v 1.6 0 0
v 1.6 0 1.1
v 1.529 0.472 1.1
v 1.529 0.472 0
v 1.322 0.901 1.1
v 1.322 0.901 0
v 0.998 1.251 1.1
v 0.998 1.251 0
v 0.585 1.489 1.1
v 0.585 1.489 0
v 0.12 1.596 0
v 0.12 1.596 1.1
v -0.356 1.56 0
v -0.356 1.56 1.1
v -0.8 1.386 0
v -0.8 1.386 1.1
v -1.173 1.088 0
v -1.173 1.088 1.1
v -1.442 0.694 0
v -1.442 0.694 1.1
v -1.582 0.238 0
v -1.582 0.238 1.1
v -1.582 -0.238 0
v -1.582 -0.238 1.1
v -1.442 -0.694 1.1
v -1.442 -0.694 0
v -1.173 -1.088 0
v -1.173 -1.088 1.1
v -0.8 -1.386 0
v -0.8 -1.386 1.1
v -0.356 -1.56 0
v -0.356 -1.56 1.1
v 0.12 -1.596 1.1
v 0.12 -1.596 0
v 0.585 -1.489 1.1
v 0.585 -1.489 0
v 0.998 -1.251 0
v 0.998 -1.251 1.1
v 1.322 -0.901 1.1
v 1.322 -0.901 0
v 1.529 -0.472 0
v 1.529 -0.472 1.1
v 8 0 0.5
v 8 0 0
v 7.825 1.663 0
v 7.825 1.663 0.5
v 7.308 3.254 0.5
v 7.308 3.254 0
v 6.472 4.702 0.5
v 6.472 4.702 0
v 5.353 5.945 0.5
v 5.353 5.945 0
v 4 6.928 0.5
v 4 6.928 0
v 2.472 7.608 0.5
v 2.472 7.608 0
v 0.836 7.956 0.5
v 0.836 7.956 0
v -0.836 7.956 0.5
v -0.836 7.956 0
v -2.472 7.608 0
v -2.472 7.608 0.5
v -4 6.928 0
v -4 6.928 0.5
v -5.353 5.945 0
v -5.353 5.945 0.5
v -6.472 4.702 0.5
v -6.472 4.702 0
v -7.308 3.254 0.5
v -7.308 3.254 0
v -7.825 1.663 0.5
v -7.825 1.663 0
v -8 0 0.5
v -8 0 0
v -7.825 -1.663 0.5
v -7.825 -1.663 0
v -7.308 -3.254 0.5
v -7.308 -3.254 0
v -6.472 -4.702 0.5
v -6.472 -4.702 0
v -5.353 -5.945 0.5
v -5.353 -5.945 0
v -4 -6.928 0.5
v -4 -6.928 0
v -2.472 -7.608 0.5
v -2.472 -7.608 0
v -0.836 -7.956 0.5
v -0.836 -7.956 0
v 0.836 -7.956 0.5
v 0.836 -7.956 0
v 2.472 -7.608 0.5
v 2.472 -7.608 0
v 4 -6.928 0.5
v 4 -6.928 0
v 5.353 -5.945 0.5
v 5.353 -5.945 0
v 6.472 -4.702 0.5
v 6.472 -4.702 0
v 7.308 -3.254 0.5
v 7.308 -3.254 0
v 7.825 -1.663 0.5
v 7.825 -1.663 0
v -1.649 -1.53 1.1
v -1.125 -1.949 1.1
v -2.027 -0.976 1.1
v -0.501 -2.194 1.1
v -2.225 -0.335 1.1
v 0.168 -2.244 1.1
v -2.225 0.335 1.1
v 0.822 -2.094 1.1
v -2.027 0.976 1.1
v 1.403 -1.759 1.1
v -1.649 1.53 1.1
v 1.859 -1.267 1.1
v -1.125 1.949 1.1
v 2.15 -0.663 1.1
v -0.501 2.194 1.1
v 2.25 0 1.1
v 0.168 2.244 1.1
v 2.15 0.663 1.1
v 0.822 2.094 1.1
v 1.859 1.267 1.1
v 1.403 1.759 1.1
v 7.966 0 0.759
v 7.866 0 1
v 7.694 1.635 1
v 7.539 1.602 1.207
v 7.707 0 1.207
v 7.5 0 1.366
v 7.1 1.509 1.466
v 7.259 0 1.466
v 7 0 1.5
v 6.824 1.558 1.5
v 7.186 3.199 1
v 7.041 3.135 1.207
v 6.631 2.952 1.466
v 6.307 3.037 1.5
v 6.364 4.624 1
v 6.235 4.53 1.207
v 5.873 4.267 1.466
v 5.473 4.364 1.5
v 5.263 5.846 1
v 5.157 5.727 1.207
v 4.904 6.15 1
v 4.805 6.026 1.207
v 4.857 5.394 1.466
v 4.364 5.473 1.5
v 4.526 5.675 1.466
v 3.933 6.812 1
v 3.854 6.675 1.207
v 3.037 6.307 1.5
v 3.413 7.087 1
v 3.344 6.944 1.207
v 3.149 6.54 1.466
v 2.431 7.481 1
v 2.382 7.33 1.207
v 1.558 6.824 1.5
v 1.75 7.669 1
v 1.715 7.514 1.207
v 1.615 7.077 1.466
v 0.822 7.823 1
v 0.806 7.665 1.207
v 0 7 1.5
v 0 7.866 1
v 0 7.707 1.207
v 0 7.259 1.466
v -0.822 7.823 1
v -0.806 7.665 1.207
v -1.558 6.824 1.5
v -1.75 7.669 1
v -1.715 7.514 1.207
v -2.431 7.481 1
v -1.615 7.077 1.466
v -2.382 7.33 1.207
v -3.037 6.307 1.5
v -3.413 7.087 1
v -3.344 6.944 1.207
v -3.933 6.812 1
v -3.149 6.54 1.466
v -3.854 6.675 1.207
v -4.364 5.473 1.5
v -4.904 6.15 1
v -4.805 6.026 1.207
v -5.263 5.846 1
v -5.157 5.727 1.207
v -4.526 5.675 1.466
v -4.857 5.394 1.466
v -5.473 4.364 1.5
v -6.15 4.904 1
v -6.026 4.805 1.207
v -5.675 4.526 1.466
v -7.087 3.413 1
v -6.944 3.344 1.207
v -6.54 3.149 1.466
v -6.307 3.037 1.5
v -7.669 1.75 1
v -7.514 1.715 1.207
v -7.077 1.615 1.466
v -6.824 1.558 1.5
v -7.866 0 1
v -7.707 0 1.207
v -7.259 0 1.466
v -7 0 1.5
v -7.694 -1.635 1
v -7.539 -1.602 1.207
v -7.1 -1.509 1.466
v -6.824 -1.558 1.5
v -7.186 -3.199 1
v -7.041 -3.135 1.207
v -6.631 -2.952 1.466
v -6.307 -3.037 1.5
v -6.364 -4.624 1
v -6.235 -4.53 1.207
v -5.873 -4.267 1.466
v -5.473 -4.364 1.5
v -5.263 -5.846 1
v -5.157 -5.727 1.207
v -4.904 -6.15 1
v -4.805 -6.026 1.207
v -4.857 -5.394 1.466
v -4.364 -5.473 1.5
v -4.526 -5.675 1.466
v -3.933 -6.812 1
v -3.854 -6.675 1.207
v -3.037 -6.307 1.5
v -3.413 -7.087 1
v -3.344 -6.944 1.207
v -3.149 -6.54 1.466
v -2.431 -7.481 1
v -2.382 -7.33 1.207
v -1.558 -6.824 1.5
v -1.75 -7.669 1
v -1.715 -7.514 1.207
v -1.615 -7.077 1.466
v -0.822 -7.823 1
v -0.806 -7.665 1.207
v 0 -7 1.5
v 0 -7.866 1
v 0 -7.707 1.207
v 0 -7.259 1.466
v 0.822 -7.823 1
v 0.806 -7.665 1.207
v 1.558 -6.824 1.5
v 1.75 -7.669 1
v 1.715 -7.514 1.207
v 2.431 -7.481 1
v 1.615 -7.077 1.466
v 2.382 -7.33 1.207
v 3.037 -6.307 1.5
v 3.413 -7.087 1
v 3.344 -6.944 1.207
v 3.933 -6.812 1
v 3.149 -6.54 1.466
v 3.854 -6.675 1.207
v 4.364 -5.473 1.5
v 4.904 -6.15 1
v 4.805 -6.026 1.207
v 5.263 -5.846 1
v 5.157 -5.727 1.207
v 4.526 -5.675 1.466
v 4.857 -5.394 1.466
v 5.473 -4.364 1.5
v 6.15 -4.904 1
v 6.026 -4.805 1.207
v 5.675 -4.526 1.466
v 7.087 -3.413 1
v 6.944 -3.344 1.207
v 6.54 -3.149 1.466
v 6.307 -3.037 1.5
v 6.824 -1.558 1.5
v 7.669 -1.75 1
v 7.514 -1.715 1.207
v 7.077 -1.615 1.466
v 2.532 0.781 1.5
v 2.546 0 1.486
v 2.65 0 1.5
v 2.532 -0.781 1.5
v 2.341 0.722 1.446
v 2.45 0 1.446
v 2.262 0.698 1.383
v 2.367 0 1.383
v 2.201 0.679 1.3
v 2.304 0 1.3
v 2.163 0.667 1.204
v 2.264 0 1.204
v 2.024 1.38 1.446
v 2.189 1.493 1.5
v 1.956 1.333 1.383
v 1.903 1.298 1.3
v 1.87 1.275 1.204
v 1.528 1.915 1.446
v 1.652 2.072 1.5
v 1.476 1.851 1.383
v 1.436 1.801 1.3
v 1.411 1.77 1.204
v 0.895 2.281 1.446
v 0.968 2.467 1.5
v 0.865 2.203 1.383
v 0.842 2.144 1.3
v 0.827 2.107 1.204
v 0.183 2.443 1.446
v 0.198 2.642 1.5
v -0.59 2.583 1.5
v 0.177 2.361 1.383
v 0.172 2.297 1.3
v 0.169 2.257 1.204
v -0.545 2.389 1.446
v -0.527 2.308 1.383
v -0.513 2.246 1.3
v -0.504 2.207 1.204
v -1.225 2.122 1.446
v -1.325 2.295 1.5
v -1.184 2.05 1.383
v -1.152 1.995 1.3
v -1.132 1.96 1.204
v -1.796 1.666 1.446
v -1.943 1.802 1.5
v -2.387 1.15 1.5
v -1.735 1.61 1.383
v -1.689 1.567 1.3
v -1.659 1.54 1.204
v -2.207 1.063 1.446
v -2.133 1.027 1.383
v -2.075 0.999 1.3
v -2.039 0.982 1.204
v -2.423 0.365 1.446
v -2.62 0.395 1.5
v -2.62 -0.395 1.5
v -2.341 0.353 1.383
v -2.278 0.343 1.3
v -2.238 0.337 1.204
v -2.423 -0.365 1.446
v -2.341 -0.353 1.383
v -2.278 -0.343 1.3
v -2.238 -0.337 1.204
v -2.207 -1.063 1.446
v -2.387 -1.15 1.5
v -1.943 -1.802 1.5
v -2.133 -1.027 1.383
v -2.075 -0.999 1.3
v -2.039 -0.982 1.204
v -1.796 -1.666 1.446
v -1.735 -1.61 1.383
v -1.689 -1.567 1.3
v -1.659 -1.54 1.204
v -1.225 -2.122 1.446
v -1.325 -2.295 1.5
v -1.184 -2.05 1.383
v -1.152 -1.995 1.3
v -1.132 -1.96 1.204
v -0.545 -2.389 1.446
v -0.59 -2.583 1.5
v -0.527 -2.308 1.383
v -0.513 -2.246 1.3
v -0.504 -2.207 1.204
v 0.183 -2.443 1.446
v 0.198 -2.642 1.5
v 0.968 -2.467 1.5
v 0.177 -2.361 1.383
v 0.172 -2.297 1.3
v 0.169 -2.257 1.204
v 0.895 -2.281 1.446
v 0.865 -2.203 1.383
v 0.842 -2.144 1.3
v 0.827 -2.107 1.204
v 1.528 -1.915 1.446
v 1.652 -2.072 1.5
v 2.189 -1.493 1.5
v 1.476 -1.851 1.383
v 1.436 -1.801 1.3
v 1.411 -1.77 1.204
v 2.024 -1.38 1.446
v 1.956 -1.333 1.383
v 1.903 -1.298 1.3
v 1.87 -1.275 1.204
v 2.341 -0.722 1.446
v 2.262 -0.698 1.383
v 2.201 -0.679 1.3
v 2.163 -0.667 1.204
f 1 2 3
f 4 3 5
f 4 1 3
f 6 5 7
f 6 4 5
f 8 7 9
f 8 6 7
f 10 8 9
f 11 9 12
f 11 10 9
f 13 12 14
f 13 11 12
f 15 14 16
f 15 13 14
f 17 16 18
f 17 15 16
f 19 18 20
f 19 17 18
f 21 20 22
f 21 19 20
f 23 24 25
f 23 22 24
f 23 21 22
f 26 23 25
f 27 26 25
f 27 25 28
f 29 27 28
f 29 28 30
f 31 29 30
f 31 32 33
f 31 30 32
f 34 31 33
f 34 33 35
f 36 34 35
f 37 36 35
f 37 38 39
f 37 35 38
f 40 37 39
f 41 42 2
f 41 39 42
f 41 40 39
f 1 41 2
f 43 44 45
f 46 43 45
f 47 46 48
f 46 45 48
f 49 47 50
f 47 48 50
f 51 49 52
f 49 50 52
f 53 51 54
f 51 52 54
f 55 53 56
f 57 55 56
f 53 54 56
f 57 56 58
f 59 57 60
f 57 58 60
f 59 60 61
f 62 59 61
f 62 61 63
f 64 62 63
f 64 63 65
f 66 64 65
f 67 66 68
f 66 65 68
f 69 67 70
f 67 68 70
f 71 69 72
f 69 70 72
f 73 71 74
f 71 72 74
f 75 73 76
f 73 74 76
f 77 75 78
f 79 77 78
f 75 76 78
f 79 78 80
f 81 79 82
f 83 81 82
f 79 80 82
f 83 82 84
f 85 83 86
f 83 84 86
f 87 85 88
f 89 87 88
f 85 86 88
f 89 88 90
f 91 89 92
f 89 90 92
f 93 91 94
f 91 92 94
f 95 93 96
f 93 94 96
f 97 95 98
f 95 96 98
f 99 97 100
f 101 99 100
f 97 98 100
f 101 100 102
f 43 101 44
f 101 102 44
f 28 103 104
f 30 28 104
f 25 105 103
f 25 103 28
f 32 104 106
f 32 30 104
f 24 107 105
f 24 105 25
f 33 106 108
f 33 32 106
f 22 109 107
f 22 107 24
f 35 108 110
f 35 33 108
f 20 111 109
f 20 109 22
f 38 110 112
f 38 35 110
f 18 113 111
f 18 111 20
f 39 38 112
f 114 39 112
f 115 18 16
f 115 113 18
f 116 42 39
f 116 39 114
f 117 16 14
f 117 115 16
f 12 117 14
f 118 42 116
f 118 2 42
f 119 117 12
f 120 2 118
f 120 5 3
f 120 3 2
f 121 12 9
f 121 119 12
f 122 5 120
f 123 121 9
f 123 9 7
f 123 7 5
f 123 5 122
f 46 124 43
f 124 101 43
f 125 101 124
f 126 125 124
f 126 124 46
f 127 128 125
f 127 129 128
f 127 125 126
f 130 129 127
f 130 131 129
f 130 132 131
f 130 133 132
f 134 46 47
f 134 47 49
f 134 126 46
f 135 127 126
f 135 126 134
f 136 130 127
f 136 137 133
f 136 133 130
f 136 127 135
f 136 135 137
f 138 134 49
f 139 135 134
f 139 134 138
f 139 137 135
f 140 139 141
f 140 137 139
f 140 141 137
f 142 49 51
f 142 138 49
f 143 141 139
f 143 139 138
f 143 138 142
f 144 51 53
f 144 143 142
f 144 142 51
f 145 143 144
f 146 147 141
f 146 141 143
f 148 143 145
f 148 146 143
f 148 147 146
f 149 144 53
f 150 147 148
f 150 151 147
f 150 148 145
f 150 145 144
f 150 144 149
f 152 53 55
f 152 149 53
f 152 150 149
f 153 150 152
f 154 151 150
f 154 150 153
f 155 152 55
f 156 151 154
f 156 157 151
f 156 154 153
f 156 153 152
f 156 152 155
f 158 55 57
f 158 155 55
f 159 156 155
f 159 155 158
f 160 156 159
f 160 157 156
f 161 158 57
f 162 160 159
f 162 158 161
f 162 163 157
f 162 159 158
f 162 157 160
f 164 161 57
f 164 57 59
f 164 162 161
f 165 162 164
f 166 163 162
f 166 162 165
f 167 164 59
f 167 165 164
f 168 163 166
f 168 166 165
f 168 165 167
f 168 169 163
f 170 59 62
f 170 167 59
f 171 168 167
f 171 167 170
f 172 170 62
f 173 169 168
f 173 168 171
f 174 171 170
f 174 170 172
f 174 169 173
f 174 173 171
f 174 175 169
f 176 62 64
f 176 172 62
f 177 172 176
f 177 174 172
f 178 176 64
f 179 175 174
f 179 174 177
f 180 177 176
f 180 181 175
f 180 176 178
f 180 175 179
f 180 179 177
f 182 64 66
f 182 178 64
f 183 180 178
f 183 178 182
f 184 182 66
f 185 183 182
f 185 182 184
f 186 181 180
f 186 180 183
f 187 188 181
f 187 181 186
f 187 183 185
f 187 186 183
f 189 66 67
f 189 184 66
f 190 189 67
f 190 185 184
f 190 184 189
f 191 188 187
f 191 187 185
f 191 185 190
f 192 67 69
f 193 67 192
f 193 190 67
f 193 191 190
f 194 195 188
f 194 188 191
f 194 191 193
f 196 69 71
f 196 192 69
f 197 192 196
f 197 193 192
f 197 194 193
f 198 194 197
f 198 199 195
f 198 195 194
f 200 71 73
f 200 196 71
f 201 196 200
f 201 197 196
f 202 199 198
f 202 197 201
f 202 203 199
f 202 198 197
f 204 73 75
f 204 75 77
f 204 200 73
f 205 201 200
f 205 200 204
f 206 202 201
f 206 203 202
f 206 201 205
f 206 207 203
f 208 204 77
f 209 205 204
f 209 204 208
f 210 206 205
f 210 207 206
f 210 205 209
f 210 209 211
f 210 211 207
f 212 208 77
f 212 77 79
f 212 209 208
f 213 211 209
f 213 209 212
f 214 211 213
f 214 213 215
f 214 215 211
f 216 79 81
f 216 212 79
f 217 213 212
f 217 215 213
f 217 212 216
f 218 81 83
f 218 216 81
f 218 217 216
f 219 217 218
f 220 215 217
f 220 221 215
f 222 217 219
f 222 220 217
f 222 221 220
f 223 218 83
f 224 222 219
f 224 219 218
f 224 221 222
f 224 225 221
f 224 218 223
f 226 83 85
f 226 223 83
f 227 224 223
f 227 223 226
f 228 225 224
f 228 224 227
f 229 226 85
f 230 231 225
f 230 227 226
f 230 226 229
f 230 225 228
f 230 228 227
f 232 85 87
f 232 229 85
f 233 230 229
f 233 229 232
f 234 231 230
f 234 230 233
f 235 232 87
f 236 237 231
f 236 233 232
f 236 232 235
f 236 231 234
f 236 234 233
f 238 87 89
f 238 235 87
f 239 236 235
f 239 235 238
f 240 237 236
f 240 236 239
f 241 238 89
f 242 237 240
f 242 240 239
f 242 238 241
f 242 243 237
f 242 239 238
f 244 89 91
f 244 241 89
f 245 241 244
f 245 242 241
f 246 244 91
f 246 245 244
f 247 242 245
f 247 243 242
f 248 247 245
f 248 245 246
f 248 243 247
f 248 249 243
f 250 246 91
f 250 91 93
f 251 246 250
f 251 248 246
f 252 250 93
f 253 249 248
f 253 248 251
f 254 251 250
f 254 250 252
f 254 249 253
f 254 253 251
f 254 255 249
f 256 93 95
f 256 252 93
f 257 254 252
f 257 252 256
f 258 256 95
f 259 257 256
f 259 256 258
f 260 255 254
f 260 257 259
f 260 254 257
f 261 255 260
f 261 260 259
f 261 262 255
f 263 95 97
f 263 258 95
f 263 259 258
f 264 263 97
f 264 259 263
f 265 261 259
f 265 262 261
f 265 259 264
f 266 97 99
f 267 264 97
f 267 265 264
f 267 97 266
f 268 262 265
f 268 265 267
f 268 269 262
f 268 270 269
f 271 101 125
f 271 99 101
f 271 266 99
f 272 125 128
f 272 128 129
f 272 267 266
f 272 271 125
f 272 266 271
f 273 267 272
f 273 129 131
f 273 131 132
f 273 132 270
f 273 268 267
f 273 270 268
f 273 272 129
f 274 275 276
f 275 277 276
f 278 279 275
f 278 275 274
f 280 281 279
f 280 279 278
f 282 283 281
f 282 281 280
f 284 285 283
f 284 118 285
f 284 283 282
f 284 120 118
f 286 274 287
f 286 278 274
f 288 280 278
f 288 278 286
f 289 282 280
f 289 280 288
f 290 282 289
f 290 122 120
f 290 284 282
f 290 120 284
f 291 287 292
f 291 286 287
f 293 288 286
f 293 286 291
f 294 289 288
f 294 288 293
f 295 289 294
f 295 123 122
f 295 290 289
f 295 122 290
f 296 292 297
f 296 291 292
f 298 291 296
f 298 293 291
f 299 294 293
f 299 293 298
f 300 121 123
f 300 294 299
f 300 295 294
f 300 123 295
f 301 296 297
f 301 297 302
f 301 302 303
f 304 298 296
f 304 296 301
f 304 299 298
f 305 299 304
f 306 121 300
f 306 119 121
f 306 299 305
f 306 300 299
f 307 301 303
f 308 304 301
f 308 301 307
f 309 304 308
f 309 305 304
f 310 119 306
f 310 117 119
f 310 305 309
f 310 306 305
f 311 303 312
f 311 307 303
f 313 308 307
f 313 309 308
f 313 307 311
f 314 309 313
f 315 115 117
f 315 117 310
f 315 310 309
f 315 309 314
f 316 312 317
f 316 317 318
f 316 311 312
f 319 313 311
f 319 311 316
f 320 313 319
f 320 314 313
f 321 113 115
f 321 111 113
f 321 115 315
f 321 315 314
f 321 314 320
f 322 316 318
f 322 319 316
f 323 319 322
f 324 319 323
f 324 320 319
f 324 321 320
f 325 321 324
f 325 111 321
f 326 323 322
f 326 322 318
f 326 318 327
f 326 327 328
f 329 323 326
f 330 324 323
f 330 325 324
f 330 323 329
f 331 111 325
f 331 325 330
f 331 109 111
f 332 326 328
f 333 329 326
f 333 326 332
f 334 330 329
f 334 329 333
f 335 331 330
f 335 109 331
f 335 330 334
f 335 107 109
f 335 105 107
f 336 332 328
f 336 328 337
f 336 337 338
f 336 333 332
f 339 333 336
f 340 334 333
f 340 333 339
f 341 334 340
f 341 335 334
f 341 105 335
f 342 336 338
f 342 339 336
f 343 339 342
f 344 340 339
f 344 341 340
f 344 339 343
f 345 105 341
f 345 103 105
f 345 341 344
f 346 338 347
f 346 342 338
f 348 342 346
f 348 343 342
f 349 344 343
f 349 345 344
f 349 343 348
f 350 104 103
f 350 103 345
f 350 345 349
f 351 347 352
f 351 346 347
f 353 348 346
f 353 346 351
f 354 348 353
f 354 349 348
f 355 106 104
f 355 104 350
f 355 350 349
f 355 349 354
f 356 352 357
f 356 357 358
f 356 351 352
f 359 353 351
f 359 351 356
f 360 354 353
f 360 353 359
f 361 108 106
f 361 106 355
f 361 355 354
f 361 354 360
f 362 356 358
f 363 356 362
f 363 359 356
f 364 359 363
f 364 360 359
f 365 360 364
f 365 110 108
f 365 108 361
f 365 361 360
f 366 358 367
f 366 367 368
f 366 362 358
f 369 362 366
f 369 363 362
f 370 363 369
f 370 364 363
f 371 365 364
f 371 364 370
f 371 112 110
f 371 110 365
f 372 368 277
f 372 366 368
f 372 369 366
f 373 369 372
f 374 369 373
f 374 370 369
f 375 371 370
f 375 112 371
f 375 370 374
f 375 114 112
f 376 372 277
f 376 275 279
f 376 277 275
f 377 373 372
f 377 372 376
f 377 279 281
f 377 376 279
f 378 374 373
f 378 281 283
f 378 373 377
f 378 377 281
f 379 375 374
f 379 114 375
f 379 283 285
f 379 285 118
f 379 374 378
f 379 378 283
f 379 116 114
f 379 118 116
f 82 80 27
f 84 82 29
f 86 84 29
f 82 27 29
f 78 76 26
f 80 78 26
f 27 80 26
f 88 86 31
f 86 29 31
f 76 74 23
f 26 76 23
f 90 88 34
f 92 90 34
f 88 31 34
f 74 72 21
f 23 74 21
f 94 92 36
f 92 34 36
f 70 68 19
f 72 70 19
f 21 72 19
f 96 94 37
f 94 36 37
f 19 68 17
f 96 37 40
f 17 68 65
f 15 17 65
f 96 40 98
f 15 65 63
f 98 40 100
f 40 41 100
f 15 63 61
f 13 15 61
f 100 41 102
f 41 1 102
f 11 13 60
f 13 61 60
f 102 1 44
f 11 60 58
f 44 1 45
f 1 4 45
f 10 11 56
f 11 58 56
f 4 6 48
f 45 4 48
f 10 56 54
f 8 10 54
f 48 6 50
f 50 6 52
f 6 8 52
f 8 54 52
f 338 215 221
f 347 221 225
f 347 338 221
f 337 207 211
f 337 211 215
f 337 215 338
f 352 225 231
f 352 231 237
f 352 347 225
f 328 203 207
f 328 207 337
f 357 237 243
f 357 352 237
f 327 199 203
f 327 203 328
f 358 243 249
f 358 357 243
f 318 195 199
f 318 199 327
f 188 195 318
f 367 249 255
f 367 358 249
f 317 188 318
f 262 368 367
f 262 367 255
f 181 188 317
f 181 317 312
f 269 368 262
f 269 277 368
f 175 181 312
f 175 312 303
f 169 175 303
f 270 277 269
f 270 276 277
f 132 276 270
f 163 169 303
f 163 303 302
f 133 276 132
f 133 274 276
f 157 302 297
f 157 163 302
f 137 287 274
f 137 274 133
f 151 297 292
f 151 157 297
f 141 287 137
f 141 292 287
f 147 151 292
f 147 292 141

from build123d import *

# Parameters (mm, degrees)
SKETCH_1_R          = 8
SKETCH_1_R_2        = 1.6
EXTRUDE_1_DEPTH     = 1.5
FILLET_1_R          = 1
SKETCH_3_R          = 2.25
CUT_EXTRUDE_3_DEPTH = 0.4
FILLET_2_R          = 0.4


with BuildPart() as part:
    # Эскиз1 → Бобышка-Вытянуть1 (new body)
    with BuildSketch(Plane.XY):
        Circle(SKETCH_1_R)
        Circle(SKETCH_1_R_2, mode=Mode.SUBTRACT)
    extrude(amount=EXTRUDE_1_DEPTH)

    # Скругление1
    fillet_1_edges = [part.edges().sort_by_distance(p)[0] for p in [
        (-8, 0, 1.5),
    ]]
    fillet(fillet_1_edges, radius=FILLET_1_R)

    # Эскиз3 → Вырез-Вытянуть3 (cut)
    with BuildSketch(Plane.XY.offset(1.5)):
        Circle(SKETCH_3_R)
    extrude(amount=-CUT_EXTRUDE_3_DEPTH, mode=Mode.SUBTRACT)

    # Скругление2
    fillet_2_edges = [part.edges().sort_by_distance(p)[0] for p in [
        (-2.25, 0, 1.5),
    ]]
    fillet(fillet_2_edges, radius=FILLET_2_R - 0.0001)  # a hair under: the kernel refuses the full size


solid = part.part
